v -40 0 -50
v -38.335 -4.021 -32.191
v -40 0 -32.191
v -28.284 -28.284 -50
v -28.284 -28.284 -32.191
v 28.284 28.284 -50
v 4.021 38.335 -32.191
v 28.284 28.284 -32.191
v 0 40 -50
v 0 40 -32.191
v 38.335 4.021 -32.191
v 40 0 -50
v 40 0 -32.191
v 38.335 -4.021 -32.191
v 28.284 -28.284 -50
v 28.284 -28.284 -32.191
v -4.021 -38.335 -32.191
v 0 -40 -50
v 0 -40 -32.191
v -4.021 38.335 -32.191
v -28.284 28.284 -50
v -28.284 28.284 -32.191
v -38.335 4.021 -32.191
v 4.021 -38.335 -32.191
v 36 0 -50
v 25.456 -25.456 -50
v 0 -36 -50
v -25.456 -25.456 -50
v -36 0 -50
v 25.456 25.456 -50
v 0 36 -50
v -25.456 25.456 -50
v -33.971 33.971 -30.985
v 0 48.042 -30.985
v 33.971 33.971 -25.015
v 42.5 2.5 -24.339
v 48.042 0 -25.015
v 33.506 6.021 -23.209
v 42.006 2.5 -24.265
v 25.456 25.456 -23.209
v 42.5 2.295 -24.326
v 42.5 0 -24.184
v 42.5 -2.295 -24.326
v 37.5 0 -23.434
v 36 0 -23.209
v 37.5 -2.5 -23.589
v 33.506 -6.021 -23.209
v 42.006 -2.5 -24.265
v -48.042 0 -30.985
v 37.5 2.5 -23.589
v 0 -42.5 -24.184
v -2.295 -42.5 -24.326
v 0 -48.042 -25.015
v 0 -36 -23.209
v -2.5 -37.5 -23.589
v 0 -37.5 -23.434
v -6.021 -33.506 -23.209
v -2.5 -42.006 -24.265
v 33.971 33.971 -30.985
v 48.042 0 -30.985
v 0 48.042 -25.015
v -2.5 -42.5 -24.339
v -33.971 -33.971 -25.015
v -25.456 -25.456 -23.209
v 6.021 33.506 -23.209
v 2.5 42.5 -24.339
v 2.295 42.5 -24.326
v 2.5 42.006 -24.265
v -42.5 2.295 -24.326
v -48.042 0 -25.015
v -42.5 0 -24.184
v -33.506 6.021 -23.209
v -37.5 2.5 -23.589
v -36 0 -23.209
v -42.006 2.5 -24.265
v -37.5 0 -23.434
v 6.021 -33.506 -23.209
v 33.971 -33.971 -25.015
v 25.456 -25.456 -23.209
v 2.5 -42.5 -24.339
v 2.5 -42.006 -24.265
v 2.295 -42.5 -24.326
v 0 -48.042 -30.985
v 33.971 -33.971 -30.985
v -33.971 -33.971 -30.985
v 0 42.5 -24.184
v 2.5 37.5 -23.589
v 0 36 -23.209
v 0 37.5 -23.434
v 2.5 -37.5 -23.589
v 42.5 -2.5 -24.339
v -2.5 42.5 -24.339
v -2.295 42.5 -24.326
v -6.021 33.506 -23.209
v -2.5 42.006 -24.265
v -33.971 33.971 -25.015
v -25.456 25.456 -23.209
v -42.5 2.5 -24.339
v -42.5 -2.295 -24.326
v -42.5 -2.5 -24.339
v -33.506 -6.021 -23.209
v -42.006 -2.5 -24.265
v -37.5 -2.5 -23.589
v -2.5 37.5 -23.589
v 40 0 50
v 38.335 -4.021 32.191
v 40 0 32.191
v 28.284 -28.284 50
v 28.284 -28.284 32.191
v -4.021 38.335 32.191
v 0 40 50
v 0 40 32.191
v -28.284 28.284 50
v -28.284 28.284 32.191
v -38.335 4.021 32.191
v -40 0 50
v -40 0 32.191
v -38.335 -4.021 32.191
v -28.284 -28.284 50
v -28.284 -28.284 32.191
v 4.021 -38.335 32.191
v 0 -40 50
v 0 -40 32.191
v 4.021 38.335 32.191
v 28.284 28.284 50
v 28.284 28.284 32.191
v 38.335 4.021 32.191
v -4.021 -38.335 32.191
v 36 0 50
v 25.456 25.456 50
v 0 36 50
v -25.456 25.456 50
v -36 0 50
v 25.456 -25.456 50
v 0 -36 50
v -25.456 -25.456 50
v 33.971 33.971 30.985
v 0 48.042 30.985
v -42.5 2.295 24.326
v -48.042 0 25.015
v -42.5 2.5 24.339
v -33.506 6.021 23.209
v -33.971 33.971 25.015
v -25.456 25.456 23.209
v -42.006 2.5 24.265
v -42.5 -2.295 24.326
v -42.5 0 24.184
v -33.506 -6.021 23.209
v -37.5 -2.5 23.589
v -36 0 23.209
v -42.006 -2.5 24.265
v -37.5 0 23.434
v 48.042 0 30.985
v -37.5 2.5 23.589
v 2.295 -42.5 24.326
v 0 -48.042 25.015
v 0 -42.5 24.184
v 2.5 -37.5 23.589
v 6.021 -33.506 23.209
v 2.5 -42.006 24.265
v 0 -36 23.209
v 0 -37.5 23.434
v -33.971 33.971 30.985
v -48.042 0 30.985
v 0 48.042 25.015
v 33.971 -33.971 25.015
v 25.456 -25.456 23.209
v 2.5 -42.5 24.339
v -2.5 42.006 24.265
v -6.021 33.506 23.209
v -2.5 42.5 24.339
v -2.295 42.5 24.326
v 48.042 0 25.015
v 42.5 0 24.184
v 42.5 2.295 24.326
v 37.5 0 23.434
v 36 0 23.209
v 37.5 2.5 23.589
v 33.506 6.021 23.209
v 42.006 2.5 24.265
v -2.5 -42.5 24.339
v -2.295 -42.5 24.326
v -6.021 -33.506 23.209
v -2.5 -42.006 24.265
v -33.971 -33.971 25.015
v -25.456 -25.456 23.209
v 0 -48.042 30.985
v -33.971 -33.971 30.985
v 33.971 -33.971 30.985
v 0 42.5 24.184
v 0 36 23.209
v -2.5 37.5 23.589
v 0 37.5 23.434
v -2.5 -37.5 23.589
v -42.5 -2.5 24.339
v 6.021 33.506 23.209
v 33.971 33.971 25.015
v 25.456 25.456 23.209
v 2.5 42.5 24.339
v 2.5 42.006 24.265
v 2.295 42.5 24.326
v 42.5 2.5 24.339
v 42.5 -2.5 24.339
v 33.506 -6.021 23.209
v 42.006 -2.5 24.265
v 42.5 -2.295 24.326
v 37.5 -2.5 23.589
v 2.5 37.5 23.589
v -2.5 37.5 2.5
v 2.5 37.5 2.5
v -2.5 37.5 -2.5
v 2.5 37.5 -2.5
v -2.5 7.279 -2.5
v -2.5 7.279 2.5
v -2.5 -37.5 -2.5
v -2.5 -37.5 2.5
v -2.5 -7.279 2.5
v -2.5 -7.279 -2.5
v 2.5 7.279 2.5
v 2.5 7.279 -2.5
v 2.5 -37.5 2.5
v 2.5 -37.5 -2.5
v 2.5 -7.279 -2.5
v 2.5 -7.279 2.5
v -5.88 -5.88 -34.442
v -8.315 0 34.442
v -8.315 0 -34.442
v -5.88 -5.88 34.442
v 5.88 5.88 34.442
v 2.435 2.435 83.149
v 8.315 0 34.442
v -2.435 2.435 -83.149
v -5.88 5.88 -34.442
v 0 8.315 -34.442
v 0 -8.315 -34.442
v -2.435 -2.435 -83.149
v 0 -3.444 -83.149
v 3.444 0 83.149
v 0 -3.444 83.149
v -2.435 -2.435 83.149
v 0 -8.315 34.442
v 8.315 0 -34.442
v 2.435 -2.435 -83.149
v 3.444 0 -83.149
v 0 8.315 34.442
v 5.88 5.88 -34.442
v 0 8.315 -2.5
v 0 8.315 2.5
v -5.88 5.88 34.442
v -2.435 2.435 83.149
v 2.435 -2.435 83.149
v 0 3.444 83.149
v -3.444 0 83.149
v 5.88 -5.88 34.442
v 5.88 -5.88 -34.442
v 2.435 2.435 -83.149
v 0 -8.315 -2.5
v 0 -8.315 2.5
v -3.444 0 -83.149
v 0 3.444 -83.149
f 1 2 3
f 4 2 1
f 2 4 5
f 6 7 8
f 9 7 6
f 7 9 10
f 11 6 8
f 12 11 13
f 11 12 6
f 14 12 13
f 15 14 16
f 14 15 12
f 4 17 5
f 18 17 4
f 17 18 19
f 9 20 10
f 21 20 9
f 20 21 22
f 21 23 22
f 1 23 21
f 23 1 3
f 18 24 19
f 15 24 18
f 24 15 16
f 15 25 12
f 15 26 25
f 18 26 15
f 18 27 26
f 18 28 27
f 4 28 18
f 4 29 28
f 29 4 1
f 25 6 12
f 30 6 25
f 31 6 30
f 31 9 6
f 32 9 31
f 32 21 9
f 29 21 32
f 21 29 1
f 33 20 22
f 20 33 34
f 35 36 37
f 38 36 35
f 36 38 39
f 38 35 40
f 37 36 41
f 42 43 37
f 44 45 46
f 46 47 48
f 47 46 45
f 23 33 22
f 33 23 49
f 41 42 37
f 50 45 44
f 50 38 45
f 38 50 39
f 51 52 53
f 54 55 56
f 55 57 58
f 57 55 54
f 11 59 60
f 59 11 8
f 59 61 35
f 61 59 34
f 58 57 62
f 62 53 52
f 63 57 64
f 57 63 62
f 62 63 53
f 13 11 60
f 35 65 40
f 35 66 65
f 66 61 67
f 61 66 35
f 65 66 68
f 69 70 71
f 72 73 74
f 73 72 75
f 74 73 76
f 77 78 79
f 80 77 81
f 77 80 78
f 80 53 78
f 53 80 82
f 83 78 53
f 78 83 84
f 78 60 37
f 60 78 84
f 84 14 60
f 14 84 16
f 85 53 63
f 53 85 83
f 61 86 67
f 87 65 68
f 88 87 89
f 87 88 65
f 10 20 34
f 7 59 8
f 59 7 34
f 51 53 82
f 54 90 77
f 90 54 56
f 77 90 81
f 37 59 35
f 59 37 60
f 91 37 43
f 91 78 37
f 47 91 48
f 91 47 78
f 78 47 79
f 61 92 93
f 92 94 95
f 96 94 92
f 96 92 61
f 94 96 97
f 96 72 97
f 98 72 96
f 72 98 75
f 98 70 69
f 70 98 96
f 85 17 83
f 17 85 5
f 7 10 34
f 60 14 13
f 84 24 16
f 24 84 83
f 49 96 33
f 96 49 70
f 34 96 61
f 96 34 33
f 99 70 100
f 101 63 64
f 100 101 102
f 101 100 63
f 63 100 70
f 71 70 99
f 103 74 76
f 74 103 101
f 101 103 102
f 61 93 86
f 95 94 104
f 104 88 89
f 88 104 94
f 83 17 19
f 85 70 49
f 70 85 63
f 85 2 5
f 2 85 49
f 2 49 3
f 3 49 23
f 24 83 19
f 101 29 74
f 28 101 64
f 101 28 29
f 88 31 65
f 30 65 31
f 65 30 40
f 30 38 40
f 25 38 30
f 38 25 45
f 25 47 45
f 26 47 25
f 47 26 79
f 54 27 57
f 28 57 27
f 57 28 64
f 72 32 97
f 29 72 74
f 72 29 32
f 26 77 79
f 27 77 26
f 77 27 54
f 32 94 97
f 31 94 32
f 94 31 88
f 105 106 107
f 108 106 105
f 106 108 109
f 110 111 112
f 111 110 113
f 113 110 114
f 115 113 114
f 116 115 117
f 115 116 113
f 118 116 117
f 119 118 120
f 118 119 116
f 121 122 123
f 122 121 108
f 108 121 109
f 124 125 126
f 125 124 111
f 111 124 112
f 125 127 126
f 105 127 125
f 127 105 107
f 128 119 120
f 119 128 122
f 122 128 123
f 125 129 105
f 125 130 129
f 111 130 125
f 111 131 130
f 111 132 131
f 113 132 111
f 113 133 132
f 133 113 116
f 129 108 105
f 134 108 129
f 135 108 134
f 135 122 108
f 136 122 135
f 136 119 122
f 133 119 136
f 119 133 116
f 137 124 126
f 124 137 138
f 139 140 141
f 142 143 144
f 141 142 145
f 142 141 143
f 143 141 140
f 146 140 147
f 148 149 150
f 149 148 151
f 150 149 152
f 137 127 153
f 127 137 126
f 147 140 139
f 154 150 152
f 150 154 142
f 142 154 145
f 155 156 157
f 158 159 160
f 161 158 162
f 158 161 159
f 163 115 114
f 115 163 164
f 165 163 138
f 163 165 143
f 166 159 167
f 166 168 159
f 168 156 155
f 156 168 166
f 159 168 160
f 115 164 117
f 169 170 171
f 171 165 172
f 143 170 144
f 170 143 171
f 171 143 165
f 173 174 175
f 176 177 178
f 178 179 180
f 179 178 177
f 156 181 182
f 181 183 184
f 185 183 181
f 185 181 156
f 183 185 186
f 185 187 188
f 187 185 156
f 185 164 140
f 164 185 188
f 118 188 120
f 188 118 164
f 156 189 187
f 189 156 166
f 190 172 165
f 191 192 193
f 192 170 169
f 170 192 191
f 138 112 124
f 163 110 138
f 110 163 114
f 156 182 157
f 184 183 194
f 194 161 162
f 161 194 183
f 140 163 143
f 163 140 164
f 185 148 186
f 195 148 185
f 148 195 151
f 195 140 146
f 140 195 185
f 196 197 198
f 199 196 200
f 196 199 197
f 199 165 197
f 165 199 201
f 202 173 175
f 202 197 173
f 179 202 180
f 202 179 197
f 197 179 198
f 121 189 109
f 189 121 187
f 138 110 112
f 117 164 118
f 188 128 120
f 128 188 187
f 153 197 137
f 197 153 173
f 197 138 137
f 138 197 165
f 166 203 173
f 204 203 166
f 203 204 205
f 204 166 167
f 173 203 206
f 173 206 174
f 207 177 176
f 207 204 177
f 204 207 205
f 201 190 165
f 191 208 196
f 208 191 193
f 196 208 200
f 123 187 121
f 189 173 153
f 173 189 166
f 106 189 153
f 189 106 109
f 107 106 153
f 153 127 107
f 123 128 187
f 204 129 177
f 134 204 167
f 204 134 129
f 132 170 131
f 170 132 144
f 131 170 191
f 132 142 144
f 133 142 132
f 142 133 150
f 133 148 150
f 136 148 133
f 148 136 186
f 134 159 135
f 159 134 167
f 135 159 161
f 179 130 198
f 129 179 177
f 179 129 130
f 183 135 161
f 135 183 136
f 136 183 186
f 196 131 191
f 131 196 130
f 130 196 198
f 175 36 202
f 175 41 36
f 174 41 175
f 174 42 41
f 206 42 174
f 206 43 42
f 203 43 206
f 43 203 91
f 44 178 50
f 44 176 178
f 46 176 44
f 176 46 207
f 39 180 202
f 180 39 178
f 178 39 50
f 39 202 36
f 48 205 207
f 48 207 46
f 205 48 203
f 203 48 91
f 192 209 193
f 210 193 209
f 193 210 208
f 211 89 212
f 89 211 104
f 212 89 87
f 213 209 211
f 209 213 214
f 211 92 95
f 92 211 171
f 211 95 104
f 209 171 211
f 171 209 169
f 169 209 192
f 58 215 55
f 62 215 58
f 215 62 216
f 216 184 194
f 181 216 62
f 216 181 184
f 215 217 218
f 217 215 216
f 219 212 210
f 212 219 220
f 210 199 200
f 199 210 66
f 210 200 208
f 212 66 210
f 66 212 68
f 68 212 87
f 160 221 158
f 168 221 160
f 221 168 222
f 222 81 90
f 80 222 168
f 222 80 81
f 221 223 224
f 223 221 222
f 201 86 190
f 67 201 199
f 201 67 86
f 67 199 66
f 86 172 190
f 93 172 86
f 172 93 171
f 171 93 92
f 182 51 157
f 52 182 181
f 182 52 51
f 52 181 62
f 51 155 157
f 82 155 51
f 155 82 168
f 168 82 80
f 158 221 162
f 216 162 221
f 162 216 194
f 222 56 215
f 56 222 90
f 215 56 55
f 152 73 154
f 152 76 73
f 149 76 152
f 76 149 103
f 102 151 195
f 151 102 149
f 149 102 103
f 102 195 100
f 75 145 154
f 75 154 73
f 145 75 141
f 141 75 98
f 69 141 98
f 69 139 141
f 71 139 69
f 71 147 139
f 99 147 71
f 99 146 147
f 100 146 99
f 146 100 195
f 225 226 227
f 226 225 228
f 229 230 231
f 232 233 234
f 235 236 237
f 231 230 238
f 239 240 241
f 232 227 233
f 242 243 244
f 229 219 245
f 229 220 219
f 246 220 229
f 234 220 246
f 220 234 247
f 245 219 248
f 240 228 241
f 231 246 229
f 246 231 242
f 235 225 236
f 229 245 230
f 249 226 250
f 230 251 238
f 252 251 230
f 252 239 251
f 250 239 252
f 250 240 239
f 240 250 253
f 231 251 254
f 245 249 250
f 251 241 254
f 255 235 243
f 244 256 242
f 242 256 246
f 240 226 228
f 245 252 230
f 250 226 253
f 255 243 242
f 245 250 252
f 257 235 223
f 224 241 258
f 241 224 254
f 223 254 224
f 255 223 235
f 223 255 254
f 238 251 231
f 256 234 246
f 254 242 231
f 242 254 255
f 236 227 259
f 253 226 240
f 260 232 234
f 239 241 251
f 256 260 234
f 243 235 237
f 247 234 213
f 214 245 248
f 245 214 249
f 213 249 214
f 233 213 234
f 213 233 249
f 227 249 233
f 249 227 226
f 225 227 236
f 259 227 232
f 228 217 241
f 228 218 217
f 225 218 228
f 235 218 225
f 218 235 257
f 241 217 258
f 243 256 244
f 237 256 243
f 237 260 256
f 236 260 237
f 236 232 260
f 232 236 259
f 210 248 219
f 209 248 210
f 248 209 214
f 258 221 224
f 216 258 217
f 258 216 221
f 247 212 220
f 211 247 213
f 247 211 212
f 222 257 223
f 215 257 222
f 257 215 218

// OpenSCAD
$fn = 8;

module end() {
	scale(v = [4, 4, 4])
	union()
	{
		difference() {
			union() {
				cylinder(h = 5, r1 = 10, r2 = 10, center = true);
				translate(v = [0, 0, 3])
					scale(v = [1, 1, 0.15])
						sphere(r = 13);
			}
			cylinder(h = 20, r1 = 9, r2 = 9, center = true);
		}
	}
}

translate(v = [0, 0, -40])
	end();
translate(v = [0, 0, 40])
	rotate(a = 180, v = [0, 1, 0])
		end();
translate(v = [40, 0, 0])
	cube(size = [5, 5, 50], center = true);
rotate(a = 90, v = [0, 0, 1])
	translate(v = [40, 0, 0])
		cube(size = [5, 5, 50], center = true);
rotate(a = -90, v = [0, 0, 1])
	translate(v = [40, 0, 0])
		cube(size = [5, 5, 50], center = true);
rotate(a = 180, v = [0, 0, 1])
	translate(v = [40, 0, 0])
		cube(size = [5, 5, 50], center = true);

scale(v = [0.1, 0.1, 1])
	sphere(r = 90);
cube(size = [5, 80, 5], center = true);
